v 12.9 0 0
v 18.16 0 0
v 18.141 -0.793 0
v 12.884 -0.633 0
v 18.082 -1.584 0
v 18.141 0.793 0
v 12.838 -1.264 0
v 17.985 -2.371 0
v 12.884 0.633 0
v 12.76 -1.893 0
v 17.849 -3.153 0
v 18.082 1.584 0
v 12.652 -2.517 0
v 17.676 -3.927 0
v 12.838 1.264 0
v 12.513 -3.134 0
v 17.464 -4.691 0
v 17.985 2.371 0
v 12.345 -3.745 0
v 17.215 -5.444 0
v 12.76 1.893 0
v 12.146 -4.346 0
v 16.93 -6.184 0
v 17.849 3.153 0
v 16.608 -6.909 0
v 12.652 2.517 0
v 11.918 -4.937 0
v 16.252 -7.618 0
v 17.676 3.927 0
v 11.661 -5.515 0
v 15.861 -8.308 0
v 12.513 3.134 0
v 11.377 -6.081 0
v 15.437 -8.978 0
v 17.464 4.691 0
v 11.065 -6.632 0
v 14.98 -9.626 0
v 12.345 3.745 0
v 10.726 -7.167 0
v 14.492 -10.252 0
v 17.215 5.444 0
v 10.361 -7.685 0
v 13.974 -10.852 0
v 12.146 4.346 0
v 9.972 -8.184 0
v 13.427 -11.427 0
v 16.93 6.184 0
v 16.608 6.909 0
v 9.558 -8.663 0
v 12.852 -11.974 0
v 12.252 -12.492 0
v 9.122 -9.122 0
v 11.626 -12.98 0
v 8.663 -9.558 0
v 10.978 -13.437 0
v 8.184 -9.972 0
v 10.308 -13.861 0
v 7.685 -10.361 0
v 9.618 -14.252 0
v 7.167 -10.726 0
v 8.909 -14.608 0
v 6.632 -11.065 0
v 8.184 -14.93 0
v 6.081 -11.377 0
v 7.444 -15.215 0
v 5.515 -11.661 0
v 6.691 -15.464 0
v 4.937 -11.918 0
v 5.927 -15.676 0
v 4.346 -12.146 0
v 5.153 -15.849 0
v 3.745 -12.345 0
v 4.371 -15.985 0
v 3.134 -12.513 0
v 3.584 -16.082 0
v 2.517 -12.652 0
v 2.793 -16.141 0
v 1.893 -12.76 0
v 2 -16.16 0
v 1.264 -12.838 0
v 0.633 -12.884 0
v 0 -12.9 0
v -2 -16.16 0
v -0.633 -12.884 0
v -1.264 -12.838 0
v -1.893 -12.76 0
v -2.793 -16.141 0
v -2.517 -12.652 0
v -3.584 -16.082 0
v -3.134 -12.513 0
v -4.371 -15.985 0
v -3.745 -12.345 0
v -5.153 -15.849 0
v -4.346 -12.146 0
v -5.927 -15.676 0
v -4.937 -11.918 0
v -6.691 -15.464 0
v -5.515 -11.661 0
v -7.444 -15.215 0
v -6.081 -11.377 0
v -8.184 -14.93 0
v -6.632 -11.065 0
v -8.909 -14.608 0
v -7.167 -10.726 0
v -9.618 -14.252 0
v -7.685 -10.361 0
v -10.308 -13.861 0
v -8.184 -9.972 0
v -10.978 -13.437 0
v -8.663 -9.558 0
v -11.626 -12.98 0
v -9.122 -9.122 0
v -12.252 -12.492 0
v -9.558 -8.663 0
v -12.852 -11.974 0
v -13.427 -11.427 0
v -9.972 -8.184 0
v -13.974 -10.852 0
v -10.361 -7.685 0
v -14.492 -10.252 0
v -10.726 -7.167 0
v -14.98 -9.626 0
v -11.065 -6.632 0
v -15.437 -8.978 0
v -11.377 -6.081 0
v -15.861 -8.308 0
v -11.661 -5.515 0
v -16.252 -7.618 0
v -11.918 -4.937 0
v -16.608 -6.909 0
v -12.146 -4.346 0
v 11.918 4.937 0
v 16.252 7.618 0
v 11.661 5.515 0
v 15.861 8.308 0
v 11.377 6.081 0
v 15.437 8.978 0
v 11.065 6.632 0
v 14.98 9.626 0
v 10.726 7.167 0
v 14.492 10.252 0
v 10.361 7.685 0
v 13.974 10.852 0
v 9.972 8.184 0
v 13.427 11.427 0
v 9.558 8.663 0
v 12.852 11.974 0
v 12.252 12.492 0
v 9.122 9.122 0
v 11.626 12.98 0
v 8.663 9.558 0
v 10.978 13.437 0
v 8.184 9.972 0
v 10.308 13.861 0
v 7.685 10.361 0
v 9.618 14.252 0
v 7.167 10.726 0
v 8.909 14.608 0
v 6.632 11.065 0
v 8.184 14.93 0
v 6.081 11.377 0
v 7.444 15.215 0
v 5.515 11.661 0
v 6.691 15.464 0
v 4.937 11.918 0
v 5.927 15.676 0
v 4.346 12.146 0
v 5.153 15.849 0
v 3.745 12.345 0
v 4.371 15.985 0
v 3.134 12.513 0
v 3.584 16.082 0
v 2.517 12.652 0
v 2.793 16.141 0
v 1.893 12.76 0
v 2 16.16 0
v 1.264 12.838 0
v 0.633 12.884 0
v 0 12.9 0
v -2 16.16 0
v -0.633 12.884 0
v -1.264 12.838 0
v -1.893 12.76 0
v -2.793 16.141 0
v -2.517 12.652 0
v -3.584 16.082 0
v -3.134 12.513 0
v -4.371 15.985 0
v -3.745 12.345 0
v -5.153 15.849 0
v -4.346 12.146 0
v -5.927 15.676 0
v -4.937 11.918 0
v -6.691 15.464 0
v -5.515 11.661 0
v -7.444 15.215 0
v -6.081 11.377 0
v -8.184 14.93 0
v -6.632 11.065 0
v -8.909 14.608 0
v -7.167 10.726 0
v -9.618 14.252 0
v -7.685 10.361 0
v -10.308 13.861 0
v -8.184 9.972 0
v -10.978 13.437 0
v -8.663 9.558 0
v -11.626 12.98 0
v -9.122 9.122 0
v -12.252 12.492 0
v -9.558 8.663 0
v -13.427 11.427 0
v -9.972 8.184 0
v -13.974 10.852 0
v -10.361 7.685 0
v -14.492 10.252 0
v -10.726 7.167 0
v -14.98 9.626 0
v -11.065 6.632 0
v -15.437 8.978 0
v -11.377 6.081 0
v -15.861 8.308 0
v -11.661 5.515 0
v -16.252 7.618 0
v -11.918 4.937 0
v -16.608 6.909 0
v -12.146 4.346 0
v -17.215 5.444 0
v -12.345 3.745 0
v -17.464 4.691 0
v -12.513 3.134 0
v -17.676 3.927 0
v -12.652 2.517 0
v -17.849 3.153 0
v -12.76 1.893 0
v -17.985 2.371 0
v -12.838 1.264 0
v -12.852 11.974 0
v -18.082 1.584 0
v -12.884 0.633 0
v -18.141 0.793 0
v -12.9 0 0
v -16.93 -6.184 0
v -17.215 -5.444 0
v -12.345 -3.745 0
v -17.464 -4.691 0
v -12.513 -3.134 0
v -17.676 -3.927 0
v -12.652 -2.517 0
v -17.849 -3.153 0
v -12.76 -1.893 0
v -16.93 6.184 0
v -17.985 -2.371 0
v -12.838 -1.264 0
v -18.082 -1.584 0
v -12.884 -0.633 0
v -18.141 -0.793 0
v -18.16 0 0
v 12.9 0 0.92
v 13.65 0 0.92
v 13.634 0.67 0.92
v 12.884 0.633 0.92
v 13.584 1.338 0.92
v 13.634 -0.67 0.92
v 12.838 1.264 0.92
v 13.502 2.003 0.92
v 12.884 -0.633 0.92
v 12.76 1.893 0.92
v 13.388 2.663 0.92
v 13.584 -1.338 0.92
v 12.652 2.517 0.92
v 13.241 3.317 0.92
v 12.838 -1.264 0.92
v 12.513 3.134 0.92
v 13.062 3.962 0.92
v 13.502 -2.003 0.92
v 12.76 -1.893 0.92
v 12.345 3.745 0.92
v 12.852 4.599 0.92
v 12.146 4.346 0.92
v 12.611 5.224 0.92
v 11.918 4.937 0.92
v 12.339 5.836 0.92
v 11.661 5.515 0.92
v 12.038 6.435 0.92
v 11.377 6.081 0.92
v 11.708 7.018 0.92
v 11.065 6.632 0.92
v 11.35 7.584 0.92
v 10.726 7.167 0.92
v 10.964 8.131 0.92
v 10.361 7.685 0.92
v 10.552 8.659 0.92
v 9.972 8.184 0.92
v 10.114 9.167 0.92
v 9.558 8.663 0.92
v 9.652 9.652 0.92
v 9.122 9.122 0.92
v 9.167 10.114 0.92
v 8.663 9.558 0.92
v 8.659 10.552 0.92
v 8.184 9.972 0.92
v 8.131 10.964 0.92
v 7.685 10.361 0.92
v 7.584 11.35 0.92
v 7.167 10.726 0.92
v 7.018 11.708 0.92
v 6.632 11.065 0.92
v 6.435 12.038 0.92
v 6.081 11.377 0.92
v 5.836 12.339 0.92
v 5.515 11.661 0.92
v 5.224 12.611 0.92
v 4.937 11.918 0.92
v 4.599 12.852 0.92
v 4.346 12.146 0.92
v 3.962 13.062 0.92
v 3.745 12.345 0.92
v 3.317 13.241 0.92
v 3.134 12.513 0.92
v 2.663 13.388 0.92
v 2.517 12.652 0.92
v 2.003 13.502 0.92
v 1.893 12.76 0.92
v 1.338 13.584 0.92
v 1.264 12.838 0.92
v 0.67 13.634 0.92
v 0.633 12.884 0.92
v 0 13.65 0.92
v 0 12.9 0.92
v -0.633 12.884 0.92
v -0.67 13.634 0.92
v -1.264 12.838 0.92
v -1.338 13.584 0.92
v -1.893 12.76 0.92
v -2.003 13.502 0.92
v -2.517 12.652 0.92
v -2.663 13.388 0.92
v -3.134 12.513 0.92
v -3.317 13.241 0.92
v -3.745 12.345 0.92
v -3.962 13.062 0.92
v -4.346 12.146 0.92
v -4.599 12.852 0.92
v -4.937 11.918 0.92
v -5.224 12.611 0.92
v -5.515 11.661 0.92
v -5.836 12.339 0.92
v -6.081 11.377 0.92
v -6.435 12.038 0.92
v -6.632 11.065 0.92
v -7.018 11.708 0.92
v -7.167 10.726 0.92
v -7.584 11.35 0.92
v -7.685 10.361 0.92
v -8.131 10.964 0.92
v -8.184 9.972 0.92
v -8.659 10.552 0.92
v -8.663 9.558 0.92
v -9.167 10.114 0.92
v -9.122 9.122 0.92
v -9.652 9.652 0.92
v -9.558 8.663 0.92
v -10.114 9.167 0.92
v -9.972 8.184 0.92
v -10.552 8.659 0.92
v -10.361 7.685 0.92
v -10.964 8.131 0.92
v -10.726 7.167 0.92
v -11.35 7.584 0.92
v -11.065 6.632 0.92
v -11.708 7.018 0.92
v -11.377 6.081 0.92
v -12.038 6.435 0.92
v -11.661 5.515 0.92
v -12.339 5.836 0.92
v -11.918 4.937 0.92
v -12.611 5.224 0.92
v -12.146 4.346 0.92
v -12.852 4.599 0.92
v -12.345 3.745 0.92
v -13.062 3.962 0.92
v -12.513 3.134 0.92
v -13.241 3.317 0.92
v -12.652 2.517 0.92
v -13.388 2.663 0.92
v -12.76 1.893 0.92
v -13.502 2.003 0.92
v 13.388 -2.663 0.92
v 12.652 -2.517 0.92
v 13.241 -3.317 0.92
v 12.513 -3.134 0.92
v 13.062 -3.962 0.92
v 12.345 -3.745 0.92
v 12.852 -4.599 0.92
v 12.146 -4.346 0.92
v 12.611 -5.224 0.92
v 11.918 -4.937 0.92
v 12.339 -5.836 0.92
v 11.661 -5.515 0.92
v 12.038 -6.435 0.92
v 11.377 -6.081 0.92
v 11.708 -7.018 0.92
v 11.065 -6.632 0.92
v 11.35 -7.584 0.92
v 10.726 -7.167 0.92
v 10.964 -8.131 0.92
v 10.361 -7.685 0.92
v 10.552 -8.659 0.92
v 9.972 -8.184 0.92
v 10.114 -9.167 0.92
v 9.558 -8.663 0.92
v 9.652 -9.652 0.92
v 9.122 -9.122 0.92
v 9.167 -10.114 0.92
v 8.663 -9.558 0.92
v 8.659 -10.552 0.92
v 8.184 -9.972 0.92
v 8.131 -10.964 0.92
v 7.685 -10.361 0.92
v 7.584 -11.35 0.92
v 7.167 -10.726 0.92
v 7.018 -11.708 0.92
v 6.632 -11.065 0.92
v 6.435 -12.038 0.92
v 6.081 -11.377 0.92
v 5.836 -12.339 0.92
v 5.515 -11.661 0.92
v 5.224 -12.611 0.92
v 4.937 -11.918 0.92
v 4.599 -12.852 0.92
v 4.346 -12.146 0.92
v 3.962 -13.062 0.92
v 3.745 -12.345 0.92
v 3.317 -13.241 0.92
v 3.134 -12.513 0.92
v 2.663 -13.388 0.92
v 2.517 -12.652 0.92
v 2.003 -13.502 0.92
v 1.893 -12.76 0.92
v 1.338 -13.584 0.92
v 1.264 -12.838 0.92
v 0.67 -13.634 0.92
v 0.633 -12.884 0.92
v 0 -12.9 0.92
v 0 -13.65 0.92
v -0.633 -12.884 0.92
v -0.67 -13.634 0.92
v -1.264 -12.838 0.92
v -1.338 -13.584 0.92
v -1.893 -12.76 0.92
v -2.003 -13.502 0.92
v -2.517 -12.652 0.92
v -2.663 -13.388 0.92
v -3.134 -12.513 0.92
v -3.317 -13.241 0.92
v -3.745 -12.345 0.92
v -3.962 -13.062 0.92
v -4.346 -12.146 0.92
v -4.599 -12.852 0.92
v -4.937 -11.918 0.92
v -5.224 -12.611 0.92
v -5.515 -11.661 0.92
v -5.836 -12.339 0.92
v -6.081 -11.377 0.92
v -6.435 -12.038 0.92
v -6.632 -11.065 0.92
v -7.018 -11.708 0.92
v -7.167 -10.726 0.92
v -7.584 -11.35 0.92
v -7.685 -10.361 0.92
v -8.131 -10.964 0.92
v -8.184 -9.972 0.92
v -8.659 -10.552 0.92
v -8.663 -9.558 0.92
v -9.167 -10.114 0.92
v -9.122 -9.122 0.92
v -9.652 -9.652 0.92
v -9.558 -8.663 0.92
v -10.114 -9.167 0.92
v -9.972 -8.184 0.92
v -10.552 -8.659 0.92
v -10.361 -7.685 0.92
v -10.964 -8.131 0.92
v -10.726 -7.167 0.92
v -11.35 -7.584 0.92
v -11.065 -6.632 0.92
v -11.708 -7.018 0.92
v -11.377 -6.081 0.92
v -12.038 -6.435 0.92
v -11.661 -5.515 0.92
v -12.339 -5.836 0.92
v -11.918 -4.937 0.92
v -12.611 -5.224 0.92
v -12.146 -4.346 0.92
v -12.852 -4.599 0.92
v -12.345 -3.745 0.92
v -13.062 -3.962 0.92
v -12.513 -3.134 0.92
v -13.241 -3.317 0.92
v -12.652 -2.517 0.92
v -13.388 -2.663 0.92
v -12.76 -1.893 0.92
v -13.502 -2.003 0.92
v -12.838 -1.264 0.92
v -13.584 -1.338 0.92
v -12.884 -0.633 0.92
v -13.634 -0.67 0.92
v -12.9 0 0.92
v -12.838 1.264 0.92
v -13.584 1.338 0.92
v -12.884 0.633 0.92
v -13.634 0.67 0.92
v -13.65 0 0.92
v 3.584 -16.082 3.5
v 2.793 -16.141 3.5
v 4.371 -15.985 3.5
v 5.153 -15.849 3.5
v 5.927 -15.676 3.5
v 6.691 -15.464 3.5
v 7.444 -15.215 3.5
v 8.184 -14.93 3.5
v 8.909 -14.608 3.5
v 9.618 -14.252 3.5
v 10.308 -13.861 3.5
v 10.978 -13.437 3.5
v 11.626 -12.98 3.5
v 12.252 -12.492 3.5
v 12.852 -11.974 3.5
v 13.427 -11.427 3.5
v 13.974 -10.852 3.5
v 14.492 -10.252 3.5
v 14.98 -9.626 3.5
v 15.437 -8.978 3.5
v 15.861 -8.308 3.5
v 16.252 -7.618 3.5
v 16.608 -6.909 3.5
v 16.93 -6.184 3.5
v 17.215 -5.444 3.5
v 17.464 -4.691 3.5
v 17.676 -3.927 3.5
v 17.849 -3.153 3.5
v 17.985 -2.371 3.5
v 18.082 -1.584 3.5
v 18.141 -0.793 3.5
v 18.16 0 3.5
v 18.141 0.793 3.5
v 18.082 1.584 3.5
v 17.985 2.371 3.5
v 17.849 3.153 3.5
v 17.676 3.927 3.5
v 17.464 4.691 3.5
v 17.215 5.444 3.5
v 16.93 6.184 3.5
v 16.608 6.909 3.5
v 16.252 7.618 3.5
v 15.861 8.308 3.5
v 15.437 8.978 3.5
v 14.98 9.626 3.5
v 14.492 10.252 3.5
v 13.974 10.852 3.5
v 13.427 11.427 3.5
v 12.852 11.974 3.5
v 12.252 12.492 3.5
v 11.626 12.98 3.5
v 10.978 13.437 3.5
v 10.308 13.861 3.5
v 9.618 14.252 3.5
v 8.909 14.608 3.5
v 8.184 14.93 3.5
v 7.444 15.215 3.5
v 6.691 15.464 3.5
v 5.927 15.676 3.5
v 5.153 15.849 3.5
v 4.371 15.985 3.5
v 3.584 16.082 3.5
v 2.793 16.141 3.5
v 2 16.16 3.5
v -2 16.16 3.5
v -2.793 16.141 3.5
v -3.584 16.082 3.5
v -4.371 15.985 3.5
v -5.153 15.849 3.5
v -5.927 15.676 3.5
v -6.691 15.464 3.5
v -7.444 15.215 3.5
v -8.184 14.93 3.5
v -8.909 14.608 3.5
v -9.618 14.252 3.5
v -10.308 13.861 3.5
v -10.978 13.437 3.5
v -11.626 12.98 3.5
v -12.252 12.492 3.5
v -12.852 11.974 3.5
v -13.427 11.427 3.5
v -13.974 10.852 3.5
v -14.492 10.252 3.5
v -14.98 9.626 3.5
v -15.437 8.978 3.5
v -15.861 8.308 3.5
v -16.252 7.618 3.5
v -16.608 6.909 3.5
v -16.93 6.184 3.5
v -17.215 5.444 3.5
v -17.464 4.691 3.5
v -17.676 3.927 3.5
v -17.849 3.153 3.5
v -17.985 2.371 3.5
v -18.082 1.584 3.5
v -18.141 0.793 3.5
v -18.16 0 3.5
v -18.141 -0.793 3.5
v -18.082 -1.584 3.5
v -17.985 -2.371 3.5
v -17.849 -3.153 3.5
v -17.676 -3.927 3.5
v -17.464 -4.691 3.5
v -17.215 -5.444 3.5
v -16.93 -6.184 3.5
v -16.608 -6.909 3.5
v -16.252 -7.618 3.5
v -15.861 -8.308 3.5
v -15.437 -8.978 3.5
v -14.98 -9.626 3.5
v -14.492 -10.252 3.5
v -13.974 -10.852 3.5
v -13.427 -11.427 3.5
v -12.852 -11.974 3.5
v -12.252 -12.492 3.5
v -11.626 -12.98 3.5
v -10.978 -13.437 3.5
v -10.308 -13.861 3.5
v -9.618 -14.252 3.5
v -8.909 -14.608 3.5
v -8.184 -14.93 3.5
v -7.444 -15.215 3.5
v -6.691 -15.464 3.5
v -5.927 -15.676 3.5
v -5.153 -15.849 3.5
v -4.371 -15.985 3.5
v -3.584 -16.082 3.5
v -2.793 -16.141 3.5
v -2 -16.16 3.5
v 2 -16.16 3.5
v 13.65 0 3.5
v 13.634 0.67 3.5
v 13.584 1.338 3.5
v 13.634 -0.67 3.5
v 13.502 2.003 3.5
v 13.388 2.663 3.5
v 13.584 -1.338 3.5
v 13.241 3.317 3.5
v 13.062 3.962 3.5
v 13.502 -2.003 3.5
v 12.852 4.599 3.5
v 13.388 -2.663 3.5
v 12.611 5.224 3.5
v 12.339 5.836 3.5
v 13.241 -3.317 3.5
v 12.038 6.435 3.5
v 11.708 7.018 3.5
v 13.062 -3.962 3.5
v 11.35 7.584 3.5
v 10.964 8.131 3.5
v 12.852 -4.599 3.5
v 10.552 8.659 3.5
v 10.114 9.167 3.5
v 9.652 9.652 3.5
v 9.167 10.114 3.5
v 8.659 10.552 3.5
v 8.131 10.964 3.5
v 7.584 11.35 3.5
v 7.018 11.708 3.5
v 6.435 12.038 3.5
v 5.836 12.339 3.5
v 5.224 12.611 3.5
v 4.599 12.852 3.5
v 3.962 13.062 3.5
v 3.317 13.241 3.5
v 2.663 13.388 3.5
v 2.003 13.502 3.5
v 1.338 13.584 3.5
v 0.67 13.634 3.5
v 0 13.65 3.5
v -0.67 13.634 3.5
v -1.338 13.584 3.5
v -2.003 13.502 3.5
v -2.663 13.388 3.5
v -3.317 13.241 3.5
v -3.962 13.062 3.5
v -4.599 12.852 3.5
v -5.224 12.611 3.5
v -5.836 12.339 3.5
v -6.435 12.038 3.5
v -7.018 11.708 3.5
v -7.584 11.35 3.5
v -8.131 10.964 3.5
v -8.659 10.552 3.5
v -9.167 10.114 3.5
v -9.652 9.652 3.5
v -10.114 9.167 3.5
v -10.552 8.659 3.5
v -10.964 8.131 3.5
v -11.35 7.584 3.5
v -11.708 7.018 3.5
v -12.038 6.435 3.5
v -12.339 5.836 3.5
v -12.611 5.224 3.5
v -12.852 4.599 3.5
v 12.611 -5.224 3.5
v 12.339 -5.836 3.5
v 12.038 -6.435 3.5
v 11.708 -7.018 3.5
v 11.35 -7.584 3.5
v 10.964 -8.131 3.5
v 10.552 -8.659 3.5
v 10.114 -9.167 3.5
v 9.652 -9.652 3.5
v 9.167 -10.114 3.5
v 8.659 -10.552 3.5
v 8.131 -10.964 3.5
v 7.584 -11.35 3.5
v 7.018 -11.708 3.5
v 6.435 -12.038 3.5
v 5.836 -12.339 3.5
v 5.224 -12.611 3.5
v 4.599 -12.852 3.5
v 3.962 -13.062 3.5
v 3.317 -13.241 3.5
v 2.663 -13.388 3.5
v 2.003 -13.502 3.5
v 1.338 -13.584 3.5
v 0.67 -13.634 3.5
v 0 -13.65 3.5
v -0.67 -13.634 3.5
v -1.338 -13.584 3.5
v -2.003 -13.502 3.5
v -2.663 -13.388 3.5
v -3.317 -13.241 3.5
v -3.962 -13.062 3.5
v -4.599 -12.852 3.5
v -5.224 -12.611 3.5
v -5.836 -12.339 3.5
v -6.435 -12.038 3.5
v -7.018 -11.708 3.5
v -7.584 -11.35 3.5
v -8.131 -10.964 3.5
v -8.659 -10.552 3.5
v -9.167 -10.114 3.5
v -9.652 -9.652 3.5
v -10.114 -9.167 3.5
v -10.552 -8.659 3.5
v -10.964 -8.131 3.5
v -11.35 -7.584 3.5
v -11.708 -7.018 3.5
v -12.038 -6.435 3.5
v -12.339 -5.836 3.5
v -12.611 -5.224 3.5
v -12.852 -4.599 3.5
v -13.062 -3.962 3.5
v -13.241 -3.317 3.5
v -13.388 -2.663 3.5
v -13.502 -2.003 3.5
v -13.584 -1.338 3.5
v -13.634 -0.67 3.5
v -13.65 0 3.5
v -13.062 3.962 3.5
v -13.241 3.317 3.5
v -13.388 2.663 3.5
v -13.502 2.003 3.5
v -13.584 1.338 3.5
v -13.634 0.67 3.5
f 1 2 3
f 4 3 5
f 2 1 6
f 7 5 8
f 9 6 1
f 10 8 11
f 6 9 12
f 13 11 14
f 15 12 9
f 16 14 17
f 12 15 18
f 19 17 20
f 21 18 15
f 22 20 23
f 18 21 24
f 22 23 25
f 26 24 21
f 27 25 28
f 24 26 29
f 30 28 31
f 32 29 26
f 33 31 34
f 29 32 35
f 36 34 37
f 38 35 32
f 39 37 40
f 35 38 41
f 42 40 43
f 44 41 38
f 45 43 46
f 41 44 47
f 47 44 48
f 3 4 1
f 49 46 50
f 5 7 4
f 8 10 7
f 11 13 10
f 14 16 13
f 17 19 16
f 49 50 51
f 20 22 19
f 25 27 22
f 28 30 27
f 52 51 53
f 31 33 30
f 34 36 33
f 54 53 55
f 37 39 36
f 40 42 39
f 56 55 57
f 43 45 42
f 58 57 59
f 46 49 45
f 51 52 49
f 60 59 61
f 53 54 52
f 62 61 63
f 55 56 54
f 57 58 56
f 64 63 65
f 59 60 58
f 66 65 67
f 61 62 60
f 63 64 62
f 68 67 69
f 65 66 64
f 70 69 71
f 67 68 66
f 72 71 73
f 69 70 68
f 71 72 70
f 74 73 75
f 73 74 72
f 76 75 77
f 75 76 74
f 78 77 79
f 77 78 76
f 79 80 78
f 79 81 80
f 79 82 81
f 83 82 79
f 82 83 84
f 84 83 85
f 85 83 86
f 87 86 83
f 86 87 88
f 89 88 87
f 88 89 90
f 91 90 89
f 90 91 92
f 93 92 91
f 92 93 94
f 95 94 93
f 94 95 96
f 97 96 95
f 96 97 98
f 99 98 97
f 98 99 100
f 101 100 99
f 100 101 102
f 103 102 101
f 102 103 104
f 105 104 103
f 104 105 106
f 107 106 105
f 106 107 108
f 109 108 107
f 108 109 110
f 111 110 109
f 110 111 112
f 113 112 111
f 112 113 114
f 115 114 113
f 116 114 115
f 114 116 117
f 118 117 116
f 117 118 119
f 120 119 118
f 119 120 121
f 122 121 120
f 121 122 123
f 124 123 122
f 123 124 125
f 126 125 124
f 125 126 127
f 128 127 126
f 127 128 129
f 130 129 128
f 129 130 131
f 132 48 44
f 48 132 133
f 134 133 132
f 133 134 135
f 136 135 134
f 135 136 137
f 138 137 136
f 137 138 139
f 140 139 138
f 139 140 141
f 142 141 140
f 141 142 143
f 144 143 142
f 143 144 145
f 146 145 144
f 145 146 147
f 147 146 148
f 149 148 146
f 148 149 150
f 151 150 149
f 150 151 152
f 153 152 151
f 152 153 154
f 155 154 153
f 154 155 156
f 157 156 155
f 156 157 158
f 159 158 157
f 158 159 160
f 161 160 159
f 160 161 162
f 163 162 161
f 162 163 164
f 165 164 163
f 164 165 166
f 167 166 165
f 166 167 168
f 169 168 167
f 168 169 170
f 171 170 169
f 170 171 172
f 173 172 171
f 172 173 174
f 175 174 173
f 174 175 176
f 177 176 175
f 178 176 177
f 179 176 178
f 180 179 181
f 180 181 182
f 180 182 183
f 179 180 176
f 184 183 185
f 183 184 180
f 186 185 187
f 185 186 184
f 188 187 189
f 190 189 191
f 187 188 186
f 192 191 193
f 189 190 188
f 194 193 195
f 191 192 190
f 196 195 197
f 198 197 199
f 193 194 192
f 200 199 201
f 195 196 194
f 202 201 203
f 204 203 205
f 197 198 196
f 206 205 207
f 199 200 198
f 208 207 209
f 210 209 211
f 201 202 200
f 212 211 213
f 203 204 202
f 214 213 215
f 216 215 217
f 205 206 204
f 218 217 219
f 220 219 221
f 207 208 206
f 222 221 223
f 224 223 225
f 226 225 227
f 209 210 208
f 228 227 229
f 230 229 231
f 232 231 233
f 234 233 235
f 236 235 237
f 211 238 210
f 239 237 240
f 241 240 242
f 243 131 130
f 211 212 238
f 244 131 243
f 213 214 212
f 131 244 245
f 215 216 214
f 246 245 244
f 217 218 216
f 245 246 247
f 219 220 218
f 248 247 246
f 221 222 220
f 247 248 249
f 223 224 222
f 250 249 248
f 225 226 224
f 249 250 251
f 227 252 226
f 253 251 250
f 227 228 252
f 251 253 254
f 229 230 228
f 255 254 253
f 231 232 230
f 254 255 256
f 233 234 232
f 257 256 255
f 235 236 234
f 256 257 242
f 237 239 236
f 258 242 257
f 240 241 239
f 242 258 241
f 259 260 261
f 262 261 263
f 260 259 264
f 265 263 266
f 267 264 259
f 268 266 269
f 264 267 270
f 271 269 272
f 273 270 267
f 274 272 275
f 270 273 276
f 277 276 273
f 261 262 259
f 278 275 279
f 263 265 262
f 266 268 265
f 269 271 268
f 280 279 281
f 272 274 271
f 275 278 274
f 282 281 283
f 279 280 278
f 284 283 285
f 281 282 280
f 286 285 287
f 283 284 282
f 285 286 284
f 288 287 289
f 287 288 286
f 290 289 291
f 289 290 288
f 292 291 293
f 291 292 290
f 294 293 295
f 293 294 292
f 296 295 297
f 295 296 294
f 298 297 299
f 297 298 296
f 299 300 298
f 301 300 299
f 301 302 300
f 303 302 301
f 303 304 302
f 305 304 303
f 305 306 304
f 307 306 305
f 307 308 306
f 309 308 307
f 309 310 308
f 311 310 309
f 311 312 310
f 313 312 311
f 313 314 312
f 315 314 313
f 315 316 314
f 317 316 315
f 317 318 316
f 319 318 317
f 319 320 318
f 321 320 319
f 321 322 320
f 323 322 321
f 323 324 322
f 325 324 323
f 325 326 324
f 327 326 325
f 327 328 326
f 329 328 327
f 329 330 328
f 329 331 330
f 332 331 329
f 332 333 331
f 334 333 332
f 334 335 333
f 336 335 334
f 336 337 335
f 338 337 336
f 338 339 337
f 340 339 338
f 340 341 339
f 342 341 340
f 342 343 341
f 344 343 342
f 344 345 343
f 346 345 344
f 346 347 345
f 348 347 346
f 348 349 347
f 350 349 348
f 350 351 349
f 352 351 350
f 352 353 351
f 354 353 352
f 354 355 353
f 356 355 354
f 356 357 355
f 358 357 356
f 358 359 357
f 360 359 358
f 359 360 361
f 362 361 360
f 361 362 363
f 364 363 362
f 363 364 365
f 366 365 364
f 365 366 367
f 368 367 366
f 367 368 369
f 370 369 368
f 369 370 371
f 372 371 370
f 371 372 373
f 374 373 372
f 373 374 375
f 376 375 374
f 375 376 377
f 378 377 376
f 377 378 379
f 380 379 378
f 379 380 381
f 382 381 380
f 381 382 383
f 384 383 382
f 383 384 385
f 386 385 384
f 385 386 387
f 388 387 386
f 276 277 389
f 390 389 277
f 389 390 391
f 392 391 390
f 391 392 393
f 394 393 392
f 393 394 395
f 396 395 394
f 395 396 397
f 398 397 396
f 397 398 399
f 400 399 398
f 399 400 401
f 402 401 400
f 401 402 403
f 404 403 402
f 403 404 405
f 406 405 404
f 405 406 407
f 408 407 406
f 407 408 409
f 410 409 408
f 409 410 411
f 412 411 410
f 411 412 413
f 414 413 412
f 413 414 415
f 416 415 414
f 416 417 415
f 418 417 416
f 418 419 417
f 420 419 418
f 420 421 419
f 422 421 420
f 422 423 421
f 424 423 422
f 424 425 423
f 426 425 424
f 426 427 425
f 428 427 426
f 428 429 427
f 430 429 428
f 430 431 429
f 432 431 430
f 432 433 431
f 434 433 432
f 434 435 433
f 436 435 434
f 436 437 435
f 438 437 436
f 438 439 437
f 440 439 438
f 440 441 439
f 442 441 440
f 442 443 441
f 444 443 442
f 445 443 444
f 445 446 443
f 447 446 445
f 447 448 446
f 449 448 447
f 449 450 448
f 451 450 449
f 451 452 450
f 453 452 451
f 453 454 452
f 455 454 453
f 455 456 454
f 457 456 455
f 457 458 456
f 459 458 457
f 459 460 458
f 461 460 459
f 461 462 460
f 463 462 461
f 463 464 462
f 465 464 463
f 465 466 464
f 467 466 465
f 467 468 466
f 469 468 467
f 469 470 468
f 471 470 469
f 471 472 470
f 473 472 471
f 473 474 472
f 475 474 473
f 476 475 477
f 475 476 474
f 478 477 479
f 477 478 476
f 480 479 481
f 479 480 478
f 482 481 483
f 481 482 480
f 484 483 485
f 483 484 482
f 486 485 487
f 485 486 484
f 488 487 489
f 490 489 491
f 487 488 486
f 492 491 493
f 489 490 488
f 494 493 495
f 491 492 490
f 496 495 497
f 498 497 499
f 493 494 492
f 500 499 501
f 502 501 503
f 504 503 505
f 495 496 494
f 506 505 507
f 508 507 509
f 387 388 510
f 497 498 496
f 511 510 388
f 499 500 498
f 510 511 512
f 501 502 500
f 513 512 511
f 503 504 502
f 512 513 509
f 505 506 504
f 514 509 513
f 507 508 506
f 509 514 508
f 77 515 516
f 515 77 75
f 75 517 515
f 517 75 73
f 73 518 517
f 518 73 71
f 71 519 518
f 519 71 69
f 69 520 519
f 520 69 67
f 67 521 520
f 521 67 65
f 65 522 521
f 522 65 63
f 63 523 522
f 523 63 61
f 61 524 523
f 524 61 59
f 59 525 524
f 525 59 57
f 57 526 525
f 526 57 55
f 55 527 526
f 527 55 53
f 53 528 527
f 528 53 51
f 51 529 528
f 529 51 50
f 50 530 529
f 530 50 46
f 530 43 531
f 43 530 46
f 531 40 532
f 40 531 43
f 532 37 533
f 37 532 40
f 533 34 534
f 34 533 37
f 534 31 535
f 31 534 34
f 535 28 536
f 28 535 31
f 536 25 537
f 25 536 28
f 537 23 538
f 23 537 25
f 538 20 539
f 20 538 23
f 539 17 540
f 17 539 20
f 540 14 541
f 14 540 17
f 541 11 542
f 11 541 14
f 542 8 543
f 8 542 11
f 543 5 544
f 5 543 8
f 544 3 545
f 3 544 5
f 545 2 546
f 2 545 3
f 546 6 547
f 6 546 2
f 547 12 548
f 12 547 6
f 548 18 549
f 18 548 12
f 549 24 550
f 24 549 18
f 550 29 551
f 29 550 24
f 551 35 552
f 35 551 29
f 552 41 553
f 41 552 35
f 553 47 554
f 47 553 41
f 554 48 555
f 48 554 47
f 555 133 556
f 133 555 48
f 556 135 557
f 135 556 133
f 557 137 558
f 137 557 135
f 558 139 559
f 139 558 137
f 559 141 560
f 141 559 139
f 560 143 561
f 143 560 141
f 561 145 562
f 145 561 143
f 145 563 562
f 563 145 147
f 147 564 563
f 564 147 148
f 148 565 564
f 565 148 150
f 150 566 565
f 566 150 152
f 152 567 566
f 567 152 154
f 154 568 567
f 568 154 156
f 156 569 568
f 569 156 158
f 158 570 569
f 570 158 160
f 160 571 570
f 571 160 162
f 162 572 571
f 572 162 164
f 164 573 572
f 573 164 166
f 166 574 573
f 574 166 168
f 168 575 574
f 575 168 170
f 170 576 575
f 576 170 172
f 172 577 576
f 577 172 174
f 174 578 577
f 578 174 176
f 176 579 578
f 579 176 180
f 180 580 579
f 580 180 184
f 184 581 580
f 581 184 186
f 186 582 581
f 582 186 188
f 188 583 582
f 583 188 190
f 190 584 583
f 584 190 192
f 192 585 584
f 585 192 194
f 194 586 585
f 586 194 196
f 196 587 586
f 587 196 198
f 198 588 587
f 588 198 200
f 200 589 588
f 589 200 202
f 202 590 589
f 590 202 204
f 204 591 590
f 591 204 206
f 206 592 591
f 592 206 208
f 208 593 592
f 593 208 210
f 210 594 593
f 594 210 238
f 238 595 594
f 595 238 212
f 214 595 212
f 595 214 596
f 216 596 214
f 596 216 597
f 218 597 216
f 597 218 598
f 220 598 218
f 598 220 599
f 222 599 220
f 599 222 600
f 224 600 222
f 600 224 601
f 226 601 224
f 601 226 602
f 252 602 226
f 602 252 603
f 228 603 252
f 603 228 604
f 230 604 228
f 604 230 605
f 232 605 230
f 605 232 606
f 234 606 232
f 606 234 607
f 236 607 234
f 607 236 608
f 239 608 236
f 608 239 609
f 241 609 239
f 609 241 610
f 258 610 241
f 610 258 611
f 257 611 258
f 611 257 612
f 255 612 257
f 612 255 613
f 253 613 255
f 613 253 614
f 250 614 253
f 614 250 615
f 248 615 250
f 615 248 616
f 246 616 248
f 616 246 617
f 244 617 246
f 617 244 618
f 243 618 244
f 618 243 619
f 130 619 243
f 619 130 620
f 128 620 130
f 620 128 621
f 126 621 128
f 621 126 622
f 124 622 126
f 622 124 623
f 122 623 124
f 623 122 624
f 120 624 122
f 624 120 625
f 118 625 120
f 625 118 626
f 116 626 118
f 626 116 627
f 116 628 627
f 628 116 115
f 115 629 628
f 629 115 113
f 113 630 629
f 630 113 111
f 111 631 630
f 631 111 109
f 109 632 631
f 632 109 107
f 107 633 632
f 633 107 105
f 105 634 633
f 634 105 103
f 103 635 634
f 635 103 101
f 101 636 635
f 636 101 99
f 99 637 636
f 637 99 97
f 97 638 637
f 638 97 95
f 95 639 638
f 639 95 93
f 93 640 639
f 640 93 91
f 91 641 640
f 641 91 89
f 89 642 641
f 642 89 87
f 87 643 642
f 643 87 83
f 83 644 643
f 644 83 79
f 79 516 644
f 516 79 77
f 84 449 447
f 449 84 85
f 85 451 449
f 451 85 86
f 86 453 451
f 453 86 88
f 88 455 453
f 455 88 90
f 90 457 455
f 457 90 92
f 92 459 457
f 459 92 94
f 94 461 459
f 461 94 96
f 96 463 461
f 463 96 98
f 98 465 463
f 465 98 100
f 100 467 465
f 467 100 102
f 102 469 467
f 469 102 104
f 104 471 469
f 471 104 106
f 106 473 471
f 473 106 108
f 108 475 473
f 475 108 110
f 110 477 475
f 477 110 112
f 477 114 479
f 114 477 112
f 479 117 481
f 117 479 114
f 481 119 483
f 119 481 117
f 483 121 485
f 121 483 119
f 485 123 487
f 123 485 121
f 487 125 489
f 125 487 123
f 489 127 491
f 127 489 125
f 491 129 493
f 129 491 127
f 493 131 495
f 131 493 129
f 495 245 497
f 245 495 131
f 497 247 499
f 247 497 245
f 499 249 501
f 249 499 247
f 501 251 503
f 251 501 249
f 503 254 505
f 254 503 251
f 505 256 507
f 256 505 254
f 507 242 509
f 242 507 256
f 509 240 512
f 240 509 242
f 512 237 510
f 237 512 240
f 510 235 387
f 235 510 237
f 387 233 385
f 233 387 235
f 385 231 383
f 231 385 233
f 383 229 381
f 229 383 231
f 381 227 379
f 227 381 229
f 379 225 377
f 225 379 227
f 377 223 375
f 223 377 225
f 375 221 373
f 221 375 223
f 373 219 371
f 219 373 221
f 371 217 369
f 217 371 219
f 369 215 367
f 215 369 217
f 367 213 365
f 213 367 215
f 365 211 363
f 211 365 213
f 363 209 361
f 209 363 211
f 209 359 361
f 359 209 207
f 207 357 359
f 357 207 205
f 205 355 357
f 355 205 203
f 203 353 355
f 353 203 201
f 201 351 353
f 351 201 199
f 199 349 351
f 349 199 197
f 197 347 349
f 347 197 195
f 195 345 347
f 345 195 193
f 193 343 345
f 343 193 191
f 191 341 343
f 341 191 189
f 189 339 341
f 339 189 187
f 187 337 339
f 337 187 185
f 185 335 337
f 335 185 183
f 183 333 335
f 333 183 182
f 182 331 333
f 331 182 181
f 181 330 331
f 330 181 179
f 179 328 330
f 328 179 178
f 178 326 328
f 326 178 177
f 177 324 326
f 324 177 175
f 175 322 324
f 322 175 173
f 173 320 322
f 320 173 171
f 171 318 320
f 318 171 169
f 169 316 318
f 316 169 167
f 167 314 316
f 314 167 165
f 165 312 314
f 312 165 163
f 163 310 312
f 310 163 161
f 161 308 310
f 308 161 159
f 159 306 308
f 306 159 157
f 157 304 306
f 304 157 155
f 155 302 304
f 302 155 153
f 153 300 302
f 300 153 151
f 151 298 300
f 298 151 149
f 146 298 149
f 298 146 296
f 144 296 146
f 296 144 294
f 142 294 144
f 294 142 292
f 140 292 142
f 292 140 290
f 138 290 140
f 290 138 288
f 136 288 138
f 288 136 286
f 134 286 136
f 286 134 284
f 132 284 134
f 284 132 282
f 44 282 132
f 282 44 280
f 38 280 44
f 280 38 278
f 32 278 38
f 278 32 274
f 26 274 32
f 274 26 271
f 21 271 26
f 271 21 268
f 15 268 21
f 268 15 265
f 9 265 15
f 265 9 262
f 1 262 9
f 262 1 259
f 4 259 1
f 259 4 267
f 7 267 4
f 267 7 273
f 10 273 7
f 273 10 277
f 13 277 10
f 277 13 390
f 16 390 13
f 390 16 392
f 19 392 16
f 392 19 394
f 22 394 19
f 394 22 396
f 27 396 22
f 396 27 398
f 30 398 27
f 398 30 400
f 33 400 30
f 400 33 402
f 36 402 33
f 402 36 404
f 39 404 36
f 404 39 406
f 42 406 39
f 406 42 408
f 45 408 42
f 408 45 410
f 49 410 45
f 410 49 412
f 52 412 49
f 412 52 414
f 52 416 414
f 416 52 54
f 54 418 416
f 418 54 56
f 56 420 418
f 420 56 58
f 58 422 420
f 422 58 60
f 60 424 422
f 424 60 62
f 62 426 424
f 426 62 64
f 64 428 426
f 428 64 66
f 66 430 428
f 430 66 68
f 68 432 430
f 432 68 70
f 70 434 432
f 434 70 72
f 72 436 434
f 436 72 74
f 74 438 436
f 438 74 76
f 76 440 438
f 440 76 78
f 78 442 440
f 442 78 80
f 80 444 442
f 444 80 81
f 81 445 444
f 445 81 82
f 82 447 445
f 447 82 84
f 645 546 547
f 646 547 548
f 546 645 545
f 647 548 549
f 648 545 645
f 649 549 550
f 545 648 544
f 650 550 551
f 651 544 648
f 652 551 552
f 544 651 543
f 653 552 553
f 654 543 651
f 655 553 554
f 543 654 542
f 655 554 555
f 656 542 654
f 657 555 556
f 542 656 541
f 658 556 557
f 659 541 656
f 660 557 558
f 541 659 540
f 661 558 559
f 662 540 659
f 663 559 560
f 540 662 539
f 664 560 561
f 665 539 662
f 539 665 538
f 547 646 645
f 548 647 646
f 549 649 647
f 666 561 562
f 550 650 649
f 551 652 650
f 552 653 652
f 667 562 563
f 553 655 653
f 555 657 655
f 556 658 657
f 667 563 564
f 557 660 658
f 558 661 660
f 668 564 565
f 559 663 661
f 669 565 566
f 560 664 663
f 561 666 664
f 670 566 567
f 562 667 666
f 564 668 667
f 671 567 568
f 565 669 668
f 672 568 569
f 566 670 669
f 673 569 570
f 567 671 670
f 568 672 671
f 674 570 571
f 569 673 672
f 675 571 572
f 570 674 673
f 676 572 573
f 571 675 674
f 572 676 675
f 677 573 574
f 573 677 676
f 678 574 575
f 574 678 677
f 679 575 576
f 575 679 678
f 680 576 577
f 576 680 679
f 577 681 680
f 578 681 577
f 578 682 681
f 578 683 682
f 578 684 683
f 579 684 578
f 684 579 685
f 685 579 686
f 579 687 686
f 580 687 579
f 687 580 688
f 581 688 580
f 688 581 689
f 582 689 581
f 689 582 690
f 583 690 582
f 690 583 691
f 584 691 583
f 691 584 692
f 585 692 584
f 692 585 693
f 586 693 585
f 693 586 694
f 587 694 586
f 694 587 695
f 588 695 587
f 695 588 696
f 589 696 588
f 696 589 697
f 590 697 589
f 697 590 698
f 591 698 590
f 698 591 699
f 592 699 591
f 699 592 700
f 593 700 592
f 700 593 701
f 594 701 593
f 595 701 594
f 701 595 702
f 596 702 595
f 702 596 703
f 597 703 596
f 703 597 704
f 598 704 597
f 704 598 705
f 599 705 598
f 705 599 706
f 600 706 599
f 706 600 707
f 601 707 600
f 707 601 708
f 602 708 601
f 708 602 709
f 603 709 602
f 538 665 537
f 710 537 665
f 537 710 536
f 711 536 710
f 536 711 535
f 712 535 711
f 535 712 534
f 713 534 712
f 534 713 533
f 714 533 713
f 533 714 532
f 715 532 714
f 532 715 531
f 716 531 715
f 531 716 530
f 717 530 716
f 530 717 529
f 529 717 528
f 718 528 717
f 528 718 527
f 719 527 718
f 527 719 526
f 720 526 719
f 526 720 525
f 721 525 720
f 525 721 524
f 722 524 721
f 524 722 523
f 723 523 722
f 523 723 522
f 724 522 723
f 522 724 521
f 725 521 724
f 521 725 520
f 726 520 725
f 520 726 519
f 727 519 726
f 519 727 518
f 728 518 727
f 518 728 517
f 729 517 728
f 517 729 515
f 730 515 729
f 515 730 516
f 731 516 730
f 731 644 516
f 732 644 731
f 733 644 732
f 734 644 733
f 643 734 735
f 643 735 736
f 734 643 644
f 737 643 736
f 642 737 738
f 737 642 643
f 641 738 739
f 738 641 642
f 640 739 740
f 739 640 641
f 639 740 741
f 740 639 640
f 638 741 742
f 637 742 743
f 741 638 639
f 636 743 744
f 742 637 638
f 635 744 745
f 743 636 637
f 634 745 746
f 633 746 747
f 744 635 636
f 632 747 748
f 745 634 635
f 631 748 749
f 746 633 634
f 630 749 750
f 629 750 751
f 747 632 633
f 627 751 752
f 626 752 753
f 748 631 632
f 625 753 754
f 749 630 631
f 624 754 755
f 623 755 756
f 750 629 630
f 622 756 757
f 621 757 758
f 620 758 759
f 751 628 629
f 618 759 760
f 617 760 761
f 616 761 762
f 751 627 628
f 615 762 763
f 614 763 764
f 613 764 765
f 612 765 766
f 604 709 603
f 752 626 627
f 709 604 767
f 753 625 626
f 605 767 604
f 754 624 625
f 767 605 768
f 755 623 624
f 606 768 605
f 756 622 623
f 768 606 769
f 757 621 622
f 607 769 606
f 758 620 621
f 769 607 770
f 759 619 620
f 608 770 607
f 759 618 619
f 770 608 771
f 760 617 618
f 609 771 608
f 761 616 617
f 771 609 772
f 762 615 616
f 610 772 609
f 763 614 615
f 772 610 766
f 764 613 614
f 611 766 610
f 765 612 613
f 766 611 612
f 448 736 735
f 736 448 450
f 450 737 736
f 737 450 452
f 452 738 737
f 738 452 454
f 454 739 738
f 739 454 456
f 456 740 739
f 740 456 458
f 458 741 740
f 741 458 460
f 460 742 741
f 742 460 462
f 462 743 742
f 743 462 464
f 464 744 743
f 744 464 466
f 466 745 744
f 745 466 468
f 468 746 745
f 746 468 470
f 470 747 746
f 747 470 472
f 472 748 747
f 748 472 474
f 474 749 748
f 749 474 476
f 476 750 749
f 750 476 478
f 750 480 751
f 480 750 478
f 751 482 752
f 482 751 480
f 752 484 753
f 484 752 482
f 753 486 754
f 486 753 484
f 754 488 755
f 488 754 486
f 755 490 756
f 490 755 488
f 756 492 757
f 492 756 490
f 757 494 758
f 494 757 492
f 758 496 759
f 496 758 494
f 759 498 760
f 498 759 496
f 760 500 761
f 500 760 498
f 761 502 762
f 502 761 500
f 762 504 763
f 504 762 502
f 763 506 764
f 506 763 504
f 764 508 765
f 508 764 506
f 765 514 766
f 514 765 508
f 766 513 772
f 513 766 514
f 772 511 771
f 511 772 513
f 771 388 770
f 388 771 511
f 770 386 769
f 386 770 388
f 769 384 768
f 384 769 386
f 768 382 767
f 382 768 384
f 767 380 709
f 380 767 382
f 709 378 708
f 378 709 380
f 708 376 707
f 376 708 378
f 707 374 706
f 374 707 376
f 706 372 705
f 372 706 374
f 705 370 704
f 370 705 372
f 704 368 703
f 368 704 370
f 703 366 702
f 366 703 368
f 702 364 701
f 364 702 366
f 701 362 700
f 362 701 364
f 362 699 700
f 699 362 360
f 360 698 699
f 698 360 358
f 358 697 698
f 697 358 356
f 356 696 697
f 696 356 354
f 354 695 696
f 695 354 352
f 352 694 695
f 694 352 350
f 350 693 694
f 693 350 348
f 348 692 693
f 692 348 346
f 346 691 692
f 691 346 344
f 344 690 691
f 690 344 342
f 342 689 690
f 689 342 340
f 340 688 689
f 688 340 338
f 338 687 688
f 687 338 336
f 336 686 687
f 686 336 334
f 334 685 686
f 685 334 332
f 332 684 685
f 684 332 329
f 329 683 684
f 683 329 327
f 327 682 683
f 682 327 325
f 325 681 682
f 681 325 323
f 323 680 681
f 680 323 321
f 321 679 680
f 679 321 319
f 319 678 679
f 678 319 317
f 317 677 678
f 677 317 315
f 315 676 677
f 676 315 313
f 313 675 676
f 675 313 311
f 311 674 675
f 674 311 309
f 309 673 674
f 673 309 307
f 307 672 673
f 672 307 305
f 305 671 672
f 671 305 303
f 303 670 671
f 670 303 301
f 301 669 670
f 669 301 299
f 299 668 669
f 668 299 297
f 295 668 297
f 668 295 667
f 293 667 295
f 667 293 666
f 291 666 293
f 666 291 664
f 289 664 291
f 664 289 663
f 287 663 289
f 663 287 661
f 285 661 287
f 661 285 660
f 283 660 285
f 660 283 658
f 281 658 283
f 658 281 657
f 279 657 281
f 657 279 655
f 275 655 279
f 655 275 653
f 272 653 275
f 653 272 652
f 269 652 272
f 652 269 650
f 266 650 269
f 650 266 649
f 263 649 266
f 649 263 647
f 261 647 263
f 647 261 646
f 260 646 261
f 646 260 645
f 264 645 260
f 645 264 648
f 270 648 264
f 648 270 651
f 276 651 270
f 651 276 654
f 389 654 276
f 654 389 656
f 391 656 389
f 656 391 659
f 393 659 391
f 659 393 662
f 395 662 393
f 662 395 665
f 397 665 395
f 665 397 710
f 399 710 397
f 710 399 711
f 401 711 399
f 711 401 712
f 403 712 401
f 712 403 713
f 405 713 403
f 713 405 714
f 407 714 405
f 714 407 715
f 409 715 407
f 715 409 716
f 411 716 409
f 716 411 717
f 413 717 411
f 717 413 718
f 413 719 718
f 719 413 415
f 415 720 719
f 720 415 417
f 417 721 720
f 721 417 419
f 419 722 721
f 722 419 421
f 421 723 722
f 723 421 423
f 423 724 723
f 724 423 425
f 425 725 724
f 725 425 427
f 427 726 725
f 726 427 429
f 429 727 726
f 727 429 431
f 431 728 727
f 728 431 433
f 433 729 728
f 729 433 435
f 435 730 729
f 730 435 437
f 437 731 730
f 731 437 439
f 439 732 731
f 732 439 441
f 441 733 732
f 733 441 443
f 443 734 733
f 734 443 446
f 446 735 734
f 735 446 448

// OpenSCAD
lensDiameter = 27;
lensTolerance = .15;
mountThickness = 3.5;
mountOuterDiameter = 32.22;
mountTolerance = -0.05;
lensEdge = 1.66;

insetDiameter = 25.8;
insertGap = 1;
insertExtraRadius = 2;

extraStretch = 4;

$fn = 128;

insetHeight = (mountThickness - lensEdge)/2;

module stretchedCircle(d=10,extra=extraStretch) {
    hull() {
        translate([-extra/2,0,0]) circle(d=d);
        translate([extra/2,0,0]) circle(d=d);
    }
}

linear_extrude(height=insetHeight)
difference() {
    stretchedCircle(d=mountOuterDiameter-2*mountTolerance);
    circle(d=insetDiameter);
}

d2 = mountOuterDiameter-2*mountTolerance;
d1 = lensDiameter+2*lensTolerance;

linear_extrude(height=mountThickness)
difference() {
    stretchedCircle(d=d2);
    circle(d=d1);
}

/*
h =insertGap+PI*(d1-insetDiameter);

translate([mountOuterDiameter+insertExtraRadius+5,0,0])
linear_extrude(height=insetHeight) difference() {
    circle(d=d1+insertExtraRadius*2);
    circle(d=insetDiameter+insertExtraRadius*2);
    translate([0,-h/2]) square([100,h]);
}
*/
